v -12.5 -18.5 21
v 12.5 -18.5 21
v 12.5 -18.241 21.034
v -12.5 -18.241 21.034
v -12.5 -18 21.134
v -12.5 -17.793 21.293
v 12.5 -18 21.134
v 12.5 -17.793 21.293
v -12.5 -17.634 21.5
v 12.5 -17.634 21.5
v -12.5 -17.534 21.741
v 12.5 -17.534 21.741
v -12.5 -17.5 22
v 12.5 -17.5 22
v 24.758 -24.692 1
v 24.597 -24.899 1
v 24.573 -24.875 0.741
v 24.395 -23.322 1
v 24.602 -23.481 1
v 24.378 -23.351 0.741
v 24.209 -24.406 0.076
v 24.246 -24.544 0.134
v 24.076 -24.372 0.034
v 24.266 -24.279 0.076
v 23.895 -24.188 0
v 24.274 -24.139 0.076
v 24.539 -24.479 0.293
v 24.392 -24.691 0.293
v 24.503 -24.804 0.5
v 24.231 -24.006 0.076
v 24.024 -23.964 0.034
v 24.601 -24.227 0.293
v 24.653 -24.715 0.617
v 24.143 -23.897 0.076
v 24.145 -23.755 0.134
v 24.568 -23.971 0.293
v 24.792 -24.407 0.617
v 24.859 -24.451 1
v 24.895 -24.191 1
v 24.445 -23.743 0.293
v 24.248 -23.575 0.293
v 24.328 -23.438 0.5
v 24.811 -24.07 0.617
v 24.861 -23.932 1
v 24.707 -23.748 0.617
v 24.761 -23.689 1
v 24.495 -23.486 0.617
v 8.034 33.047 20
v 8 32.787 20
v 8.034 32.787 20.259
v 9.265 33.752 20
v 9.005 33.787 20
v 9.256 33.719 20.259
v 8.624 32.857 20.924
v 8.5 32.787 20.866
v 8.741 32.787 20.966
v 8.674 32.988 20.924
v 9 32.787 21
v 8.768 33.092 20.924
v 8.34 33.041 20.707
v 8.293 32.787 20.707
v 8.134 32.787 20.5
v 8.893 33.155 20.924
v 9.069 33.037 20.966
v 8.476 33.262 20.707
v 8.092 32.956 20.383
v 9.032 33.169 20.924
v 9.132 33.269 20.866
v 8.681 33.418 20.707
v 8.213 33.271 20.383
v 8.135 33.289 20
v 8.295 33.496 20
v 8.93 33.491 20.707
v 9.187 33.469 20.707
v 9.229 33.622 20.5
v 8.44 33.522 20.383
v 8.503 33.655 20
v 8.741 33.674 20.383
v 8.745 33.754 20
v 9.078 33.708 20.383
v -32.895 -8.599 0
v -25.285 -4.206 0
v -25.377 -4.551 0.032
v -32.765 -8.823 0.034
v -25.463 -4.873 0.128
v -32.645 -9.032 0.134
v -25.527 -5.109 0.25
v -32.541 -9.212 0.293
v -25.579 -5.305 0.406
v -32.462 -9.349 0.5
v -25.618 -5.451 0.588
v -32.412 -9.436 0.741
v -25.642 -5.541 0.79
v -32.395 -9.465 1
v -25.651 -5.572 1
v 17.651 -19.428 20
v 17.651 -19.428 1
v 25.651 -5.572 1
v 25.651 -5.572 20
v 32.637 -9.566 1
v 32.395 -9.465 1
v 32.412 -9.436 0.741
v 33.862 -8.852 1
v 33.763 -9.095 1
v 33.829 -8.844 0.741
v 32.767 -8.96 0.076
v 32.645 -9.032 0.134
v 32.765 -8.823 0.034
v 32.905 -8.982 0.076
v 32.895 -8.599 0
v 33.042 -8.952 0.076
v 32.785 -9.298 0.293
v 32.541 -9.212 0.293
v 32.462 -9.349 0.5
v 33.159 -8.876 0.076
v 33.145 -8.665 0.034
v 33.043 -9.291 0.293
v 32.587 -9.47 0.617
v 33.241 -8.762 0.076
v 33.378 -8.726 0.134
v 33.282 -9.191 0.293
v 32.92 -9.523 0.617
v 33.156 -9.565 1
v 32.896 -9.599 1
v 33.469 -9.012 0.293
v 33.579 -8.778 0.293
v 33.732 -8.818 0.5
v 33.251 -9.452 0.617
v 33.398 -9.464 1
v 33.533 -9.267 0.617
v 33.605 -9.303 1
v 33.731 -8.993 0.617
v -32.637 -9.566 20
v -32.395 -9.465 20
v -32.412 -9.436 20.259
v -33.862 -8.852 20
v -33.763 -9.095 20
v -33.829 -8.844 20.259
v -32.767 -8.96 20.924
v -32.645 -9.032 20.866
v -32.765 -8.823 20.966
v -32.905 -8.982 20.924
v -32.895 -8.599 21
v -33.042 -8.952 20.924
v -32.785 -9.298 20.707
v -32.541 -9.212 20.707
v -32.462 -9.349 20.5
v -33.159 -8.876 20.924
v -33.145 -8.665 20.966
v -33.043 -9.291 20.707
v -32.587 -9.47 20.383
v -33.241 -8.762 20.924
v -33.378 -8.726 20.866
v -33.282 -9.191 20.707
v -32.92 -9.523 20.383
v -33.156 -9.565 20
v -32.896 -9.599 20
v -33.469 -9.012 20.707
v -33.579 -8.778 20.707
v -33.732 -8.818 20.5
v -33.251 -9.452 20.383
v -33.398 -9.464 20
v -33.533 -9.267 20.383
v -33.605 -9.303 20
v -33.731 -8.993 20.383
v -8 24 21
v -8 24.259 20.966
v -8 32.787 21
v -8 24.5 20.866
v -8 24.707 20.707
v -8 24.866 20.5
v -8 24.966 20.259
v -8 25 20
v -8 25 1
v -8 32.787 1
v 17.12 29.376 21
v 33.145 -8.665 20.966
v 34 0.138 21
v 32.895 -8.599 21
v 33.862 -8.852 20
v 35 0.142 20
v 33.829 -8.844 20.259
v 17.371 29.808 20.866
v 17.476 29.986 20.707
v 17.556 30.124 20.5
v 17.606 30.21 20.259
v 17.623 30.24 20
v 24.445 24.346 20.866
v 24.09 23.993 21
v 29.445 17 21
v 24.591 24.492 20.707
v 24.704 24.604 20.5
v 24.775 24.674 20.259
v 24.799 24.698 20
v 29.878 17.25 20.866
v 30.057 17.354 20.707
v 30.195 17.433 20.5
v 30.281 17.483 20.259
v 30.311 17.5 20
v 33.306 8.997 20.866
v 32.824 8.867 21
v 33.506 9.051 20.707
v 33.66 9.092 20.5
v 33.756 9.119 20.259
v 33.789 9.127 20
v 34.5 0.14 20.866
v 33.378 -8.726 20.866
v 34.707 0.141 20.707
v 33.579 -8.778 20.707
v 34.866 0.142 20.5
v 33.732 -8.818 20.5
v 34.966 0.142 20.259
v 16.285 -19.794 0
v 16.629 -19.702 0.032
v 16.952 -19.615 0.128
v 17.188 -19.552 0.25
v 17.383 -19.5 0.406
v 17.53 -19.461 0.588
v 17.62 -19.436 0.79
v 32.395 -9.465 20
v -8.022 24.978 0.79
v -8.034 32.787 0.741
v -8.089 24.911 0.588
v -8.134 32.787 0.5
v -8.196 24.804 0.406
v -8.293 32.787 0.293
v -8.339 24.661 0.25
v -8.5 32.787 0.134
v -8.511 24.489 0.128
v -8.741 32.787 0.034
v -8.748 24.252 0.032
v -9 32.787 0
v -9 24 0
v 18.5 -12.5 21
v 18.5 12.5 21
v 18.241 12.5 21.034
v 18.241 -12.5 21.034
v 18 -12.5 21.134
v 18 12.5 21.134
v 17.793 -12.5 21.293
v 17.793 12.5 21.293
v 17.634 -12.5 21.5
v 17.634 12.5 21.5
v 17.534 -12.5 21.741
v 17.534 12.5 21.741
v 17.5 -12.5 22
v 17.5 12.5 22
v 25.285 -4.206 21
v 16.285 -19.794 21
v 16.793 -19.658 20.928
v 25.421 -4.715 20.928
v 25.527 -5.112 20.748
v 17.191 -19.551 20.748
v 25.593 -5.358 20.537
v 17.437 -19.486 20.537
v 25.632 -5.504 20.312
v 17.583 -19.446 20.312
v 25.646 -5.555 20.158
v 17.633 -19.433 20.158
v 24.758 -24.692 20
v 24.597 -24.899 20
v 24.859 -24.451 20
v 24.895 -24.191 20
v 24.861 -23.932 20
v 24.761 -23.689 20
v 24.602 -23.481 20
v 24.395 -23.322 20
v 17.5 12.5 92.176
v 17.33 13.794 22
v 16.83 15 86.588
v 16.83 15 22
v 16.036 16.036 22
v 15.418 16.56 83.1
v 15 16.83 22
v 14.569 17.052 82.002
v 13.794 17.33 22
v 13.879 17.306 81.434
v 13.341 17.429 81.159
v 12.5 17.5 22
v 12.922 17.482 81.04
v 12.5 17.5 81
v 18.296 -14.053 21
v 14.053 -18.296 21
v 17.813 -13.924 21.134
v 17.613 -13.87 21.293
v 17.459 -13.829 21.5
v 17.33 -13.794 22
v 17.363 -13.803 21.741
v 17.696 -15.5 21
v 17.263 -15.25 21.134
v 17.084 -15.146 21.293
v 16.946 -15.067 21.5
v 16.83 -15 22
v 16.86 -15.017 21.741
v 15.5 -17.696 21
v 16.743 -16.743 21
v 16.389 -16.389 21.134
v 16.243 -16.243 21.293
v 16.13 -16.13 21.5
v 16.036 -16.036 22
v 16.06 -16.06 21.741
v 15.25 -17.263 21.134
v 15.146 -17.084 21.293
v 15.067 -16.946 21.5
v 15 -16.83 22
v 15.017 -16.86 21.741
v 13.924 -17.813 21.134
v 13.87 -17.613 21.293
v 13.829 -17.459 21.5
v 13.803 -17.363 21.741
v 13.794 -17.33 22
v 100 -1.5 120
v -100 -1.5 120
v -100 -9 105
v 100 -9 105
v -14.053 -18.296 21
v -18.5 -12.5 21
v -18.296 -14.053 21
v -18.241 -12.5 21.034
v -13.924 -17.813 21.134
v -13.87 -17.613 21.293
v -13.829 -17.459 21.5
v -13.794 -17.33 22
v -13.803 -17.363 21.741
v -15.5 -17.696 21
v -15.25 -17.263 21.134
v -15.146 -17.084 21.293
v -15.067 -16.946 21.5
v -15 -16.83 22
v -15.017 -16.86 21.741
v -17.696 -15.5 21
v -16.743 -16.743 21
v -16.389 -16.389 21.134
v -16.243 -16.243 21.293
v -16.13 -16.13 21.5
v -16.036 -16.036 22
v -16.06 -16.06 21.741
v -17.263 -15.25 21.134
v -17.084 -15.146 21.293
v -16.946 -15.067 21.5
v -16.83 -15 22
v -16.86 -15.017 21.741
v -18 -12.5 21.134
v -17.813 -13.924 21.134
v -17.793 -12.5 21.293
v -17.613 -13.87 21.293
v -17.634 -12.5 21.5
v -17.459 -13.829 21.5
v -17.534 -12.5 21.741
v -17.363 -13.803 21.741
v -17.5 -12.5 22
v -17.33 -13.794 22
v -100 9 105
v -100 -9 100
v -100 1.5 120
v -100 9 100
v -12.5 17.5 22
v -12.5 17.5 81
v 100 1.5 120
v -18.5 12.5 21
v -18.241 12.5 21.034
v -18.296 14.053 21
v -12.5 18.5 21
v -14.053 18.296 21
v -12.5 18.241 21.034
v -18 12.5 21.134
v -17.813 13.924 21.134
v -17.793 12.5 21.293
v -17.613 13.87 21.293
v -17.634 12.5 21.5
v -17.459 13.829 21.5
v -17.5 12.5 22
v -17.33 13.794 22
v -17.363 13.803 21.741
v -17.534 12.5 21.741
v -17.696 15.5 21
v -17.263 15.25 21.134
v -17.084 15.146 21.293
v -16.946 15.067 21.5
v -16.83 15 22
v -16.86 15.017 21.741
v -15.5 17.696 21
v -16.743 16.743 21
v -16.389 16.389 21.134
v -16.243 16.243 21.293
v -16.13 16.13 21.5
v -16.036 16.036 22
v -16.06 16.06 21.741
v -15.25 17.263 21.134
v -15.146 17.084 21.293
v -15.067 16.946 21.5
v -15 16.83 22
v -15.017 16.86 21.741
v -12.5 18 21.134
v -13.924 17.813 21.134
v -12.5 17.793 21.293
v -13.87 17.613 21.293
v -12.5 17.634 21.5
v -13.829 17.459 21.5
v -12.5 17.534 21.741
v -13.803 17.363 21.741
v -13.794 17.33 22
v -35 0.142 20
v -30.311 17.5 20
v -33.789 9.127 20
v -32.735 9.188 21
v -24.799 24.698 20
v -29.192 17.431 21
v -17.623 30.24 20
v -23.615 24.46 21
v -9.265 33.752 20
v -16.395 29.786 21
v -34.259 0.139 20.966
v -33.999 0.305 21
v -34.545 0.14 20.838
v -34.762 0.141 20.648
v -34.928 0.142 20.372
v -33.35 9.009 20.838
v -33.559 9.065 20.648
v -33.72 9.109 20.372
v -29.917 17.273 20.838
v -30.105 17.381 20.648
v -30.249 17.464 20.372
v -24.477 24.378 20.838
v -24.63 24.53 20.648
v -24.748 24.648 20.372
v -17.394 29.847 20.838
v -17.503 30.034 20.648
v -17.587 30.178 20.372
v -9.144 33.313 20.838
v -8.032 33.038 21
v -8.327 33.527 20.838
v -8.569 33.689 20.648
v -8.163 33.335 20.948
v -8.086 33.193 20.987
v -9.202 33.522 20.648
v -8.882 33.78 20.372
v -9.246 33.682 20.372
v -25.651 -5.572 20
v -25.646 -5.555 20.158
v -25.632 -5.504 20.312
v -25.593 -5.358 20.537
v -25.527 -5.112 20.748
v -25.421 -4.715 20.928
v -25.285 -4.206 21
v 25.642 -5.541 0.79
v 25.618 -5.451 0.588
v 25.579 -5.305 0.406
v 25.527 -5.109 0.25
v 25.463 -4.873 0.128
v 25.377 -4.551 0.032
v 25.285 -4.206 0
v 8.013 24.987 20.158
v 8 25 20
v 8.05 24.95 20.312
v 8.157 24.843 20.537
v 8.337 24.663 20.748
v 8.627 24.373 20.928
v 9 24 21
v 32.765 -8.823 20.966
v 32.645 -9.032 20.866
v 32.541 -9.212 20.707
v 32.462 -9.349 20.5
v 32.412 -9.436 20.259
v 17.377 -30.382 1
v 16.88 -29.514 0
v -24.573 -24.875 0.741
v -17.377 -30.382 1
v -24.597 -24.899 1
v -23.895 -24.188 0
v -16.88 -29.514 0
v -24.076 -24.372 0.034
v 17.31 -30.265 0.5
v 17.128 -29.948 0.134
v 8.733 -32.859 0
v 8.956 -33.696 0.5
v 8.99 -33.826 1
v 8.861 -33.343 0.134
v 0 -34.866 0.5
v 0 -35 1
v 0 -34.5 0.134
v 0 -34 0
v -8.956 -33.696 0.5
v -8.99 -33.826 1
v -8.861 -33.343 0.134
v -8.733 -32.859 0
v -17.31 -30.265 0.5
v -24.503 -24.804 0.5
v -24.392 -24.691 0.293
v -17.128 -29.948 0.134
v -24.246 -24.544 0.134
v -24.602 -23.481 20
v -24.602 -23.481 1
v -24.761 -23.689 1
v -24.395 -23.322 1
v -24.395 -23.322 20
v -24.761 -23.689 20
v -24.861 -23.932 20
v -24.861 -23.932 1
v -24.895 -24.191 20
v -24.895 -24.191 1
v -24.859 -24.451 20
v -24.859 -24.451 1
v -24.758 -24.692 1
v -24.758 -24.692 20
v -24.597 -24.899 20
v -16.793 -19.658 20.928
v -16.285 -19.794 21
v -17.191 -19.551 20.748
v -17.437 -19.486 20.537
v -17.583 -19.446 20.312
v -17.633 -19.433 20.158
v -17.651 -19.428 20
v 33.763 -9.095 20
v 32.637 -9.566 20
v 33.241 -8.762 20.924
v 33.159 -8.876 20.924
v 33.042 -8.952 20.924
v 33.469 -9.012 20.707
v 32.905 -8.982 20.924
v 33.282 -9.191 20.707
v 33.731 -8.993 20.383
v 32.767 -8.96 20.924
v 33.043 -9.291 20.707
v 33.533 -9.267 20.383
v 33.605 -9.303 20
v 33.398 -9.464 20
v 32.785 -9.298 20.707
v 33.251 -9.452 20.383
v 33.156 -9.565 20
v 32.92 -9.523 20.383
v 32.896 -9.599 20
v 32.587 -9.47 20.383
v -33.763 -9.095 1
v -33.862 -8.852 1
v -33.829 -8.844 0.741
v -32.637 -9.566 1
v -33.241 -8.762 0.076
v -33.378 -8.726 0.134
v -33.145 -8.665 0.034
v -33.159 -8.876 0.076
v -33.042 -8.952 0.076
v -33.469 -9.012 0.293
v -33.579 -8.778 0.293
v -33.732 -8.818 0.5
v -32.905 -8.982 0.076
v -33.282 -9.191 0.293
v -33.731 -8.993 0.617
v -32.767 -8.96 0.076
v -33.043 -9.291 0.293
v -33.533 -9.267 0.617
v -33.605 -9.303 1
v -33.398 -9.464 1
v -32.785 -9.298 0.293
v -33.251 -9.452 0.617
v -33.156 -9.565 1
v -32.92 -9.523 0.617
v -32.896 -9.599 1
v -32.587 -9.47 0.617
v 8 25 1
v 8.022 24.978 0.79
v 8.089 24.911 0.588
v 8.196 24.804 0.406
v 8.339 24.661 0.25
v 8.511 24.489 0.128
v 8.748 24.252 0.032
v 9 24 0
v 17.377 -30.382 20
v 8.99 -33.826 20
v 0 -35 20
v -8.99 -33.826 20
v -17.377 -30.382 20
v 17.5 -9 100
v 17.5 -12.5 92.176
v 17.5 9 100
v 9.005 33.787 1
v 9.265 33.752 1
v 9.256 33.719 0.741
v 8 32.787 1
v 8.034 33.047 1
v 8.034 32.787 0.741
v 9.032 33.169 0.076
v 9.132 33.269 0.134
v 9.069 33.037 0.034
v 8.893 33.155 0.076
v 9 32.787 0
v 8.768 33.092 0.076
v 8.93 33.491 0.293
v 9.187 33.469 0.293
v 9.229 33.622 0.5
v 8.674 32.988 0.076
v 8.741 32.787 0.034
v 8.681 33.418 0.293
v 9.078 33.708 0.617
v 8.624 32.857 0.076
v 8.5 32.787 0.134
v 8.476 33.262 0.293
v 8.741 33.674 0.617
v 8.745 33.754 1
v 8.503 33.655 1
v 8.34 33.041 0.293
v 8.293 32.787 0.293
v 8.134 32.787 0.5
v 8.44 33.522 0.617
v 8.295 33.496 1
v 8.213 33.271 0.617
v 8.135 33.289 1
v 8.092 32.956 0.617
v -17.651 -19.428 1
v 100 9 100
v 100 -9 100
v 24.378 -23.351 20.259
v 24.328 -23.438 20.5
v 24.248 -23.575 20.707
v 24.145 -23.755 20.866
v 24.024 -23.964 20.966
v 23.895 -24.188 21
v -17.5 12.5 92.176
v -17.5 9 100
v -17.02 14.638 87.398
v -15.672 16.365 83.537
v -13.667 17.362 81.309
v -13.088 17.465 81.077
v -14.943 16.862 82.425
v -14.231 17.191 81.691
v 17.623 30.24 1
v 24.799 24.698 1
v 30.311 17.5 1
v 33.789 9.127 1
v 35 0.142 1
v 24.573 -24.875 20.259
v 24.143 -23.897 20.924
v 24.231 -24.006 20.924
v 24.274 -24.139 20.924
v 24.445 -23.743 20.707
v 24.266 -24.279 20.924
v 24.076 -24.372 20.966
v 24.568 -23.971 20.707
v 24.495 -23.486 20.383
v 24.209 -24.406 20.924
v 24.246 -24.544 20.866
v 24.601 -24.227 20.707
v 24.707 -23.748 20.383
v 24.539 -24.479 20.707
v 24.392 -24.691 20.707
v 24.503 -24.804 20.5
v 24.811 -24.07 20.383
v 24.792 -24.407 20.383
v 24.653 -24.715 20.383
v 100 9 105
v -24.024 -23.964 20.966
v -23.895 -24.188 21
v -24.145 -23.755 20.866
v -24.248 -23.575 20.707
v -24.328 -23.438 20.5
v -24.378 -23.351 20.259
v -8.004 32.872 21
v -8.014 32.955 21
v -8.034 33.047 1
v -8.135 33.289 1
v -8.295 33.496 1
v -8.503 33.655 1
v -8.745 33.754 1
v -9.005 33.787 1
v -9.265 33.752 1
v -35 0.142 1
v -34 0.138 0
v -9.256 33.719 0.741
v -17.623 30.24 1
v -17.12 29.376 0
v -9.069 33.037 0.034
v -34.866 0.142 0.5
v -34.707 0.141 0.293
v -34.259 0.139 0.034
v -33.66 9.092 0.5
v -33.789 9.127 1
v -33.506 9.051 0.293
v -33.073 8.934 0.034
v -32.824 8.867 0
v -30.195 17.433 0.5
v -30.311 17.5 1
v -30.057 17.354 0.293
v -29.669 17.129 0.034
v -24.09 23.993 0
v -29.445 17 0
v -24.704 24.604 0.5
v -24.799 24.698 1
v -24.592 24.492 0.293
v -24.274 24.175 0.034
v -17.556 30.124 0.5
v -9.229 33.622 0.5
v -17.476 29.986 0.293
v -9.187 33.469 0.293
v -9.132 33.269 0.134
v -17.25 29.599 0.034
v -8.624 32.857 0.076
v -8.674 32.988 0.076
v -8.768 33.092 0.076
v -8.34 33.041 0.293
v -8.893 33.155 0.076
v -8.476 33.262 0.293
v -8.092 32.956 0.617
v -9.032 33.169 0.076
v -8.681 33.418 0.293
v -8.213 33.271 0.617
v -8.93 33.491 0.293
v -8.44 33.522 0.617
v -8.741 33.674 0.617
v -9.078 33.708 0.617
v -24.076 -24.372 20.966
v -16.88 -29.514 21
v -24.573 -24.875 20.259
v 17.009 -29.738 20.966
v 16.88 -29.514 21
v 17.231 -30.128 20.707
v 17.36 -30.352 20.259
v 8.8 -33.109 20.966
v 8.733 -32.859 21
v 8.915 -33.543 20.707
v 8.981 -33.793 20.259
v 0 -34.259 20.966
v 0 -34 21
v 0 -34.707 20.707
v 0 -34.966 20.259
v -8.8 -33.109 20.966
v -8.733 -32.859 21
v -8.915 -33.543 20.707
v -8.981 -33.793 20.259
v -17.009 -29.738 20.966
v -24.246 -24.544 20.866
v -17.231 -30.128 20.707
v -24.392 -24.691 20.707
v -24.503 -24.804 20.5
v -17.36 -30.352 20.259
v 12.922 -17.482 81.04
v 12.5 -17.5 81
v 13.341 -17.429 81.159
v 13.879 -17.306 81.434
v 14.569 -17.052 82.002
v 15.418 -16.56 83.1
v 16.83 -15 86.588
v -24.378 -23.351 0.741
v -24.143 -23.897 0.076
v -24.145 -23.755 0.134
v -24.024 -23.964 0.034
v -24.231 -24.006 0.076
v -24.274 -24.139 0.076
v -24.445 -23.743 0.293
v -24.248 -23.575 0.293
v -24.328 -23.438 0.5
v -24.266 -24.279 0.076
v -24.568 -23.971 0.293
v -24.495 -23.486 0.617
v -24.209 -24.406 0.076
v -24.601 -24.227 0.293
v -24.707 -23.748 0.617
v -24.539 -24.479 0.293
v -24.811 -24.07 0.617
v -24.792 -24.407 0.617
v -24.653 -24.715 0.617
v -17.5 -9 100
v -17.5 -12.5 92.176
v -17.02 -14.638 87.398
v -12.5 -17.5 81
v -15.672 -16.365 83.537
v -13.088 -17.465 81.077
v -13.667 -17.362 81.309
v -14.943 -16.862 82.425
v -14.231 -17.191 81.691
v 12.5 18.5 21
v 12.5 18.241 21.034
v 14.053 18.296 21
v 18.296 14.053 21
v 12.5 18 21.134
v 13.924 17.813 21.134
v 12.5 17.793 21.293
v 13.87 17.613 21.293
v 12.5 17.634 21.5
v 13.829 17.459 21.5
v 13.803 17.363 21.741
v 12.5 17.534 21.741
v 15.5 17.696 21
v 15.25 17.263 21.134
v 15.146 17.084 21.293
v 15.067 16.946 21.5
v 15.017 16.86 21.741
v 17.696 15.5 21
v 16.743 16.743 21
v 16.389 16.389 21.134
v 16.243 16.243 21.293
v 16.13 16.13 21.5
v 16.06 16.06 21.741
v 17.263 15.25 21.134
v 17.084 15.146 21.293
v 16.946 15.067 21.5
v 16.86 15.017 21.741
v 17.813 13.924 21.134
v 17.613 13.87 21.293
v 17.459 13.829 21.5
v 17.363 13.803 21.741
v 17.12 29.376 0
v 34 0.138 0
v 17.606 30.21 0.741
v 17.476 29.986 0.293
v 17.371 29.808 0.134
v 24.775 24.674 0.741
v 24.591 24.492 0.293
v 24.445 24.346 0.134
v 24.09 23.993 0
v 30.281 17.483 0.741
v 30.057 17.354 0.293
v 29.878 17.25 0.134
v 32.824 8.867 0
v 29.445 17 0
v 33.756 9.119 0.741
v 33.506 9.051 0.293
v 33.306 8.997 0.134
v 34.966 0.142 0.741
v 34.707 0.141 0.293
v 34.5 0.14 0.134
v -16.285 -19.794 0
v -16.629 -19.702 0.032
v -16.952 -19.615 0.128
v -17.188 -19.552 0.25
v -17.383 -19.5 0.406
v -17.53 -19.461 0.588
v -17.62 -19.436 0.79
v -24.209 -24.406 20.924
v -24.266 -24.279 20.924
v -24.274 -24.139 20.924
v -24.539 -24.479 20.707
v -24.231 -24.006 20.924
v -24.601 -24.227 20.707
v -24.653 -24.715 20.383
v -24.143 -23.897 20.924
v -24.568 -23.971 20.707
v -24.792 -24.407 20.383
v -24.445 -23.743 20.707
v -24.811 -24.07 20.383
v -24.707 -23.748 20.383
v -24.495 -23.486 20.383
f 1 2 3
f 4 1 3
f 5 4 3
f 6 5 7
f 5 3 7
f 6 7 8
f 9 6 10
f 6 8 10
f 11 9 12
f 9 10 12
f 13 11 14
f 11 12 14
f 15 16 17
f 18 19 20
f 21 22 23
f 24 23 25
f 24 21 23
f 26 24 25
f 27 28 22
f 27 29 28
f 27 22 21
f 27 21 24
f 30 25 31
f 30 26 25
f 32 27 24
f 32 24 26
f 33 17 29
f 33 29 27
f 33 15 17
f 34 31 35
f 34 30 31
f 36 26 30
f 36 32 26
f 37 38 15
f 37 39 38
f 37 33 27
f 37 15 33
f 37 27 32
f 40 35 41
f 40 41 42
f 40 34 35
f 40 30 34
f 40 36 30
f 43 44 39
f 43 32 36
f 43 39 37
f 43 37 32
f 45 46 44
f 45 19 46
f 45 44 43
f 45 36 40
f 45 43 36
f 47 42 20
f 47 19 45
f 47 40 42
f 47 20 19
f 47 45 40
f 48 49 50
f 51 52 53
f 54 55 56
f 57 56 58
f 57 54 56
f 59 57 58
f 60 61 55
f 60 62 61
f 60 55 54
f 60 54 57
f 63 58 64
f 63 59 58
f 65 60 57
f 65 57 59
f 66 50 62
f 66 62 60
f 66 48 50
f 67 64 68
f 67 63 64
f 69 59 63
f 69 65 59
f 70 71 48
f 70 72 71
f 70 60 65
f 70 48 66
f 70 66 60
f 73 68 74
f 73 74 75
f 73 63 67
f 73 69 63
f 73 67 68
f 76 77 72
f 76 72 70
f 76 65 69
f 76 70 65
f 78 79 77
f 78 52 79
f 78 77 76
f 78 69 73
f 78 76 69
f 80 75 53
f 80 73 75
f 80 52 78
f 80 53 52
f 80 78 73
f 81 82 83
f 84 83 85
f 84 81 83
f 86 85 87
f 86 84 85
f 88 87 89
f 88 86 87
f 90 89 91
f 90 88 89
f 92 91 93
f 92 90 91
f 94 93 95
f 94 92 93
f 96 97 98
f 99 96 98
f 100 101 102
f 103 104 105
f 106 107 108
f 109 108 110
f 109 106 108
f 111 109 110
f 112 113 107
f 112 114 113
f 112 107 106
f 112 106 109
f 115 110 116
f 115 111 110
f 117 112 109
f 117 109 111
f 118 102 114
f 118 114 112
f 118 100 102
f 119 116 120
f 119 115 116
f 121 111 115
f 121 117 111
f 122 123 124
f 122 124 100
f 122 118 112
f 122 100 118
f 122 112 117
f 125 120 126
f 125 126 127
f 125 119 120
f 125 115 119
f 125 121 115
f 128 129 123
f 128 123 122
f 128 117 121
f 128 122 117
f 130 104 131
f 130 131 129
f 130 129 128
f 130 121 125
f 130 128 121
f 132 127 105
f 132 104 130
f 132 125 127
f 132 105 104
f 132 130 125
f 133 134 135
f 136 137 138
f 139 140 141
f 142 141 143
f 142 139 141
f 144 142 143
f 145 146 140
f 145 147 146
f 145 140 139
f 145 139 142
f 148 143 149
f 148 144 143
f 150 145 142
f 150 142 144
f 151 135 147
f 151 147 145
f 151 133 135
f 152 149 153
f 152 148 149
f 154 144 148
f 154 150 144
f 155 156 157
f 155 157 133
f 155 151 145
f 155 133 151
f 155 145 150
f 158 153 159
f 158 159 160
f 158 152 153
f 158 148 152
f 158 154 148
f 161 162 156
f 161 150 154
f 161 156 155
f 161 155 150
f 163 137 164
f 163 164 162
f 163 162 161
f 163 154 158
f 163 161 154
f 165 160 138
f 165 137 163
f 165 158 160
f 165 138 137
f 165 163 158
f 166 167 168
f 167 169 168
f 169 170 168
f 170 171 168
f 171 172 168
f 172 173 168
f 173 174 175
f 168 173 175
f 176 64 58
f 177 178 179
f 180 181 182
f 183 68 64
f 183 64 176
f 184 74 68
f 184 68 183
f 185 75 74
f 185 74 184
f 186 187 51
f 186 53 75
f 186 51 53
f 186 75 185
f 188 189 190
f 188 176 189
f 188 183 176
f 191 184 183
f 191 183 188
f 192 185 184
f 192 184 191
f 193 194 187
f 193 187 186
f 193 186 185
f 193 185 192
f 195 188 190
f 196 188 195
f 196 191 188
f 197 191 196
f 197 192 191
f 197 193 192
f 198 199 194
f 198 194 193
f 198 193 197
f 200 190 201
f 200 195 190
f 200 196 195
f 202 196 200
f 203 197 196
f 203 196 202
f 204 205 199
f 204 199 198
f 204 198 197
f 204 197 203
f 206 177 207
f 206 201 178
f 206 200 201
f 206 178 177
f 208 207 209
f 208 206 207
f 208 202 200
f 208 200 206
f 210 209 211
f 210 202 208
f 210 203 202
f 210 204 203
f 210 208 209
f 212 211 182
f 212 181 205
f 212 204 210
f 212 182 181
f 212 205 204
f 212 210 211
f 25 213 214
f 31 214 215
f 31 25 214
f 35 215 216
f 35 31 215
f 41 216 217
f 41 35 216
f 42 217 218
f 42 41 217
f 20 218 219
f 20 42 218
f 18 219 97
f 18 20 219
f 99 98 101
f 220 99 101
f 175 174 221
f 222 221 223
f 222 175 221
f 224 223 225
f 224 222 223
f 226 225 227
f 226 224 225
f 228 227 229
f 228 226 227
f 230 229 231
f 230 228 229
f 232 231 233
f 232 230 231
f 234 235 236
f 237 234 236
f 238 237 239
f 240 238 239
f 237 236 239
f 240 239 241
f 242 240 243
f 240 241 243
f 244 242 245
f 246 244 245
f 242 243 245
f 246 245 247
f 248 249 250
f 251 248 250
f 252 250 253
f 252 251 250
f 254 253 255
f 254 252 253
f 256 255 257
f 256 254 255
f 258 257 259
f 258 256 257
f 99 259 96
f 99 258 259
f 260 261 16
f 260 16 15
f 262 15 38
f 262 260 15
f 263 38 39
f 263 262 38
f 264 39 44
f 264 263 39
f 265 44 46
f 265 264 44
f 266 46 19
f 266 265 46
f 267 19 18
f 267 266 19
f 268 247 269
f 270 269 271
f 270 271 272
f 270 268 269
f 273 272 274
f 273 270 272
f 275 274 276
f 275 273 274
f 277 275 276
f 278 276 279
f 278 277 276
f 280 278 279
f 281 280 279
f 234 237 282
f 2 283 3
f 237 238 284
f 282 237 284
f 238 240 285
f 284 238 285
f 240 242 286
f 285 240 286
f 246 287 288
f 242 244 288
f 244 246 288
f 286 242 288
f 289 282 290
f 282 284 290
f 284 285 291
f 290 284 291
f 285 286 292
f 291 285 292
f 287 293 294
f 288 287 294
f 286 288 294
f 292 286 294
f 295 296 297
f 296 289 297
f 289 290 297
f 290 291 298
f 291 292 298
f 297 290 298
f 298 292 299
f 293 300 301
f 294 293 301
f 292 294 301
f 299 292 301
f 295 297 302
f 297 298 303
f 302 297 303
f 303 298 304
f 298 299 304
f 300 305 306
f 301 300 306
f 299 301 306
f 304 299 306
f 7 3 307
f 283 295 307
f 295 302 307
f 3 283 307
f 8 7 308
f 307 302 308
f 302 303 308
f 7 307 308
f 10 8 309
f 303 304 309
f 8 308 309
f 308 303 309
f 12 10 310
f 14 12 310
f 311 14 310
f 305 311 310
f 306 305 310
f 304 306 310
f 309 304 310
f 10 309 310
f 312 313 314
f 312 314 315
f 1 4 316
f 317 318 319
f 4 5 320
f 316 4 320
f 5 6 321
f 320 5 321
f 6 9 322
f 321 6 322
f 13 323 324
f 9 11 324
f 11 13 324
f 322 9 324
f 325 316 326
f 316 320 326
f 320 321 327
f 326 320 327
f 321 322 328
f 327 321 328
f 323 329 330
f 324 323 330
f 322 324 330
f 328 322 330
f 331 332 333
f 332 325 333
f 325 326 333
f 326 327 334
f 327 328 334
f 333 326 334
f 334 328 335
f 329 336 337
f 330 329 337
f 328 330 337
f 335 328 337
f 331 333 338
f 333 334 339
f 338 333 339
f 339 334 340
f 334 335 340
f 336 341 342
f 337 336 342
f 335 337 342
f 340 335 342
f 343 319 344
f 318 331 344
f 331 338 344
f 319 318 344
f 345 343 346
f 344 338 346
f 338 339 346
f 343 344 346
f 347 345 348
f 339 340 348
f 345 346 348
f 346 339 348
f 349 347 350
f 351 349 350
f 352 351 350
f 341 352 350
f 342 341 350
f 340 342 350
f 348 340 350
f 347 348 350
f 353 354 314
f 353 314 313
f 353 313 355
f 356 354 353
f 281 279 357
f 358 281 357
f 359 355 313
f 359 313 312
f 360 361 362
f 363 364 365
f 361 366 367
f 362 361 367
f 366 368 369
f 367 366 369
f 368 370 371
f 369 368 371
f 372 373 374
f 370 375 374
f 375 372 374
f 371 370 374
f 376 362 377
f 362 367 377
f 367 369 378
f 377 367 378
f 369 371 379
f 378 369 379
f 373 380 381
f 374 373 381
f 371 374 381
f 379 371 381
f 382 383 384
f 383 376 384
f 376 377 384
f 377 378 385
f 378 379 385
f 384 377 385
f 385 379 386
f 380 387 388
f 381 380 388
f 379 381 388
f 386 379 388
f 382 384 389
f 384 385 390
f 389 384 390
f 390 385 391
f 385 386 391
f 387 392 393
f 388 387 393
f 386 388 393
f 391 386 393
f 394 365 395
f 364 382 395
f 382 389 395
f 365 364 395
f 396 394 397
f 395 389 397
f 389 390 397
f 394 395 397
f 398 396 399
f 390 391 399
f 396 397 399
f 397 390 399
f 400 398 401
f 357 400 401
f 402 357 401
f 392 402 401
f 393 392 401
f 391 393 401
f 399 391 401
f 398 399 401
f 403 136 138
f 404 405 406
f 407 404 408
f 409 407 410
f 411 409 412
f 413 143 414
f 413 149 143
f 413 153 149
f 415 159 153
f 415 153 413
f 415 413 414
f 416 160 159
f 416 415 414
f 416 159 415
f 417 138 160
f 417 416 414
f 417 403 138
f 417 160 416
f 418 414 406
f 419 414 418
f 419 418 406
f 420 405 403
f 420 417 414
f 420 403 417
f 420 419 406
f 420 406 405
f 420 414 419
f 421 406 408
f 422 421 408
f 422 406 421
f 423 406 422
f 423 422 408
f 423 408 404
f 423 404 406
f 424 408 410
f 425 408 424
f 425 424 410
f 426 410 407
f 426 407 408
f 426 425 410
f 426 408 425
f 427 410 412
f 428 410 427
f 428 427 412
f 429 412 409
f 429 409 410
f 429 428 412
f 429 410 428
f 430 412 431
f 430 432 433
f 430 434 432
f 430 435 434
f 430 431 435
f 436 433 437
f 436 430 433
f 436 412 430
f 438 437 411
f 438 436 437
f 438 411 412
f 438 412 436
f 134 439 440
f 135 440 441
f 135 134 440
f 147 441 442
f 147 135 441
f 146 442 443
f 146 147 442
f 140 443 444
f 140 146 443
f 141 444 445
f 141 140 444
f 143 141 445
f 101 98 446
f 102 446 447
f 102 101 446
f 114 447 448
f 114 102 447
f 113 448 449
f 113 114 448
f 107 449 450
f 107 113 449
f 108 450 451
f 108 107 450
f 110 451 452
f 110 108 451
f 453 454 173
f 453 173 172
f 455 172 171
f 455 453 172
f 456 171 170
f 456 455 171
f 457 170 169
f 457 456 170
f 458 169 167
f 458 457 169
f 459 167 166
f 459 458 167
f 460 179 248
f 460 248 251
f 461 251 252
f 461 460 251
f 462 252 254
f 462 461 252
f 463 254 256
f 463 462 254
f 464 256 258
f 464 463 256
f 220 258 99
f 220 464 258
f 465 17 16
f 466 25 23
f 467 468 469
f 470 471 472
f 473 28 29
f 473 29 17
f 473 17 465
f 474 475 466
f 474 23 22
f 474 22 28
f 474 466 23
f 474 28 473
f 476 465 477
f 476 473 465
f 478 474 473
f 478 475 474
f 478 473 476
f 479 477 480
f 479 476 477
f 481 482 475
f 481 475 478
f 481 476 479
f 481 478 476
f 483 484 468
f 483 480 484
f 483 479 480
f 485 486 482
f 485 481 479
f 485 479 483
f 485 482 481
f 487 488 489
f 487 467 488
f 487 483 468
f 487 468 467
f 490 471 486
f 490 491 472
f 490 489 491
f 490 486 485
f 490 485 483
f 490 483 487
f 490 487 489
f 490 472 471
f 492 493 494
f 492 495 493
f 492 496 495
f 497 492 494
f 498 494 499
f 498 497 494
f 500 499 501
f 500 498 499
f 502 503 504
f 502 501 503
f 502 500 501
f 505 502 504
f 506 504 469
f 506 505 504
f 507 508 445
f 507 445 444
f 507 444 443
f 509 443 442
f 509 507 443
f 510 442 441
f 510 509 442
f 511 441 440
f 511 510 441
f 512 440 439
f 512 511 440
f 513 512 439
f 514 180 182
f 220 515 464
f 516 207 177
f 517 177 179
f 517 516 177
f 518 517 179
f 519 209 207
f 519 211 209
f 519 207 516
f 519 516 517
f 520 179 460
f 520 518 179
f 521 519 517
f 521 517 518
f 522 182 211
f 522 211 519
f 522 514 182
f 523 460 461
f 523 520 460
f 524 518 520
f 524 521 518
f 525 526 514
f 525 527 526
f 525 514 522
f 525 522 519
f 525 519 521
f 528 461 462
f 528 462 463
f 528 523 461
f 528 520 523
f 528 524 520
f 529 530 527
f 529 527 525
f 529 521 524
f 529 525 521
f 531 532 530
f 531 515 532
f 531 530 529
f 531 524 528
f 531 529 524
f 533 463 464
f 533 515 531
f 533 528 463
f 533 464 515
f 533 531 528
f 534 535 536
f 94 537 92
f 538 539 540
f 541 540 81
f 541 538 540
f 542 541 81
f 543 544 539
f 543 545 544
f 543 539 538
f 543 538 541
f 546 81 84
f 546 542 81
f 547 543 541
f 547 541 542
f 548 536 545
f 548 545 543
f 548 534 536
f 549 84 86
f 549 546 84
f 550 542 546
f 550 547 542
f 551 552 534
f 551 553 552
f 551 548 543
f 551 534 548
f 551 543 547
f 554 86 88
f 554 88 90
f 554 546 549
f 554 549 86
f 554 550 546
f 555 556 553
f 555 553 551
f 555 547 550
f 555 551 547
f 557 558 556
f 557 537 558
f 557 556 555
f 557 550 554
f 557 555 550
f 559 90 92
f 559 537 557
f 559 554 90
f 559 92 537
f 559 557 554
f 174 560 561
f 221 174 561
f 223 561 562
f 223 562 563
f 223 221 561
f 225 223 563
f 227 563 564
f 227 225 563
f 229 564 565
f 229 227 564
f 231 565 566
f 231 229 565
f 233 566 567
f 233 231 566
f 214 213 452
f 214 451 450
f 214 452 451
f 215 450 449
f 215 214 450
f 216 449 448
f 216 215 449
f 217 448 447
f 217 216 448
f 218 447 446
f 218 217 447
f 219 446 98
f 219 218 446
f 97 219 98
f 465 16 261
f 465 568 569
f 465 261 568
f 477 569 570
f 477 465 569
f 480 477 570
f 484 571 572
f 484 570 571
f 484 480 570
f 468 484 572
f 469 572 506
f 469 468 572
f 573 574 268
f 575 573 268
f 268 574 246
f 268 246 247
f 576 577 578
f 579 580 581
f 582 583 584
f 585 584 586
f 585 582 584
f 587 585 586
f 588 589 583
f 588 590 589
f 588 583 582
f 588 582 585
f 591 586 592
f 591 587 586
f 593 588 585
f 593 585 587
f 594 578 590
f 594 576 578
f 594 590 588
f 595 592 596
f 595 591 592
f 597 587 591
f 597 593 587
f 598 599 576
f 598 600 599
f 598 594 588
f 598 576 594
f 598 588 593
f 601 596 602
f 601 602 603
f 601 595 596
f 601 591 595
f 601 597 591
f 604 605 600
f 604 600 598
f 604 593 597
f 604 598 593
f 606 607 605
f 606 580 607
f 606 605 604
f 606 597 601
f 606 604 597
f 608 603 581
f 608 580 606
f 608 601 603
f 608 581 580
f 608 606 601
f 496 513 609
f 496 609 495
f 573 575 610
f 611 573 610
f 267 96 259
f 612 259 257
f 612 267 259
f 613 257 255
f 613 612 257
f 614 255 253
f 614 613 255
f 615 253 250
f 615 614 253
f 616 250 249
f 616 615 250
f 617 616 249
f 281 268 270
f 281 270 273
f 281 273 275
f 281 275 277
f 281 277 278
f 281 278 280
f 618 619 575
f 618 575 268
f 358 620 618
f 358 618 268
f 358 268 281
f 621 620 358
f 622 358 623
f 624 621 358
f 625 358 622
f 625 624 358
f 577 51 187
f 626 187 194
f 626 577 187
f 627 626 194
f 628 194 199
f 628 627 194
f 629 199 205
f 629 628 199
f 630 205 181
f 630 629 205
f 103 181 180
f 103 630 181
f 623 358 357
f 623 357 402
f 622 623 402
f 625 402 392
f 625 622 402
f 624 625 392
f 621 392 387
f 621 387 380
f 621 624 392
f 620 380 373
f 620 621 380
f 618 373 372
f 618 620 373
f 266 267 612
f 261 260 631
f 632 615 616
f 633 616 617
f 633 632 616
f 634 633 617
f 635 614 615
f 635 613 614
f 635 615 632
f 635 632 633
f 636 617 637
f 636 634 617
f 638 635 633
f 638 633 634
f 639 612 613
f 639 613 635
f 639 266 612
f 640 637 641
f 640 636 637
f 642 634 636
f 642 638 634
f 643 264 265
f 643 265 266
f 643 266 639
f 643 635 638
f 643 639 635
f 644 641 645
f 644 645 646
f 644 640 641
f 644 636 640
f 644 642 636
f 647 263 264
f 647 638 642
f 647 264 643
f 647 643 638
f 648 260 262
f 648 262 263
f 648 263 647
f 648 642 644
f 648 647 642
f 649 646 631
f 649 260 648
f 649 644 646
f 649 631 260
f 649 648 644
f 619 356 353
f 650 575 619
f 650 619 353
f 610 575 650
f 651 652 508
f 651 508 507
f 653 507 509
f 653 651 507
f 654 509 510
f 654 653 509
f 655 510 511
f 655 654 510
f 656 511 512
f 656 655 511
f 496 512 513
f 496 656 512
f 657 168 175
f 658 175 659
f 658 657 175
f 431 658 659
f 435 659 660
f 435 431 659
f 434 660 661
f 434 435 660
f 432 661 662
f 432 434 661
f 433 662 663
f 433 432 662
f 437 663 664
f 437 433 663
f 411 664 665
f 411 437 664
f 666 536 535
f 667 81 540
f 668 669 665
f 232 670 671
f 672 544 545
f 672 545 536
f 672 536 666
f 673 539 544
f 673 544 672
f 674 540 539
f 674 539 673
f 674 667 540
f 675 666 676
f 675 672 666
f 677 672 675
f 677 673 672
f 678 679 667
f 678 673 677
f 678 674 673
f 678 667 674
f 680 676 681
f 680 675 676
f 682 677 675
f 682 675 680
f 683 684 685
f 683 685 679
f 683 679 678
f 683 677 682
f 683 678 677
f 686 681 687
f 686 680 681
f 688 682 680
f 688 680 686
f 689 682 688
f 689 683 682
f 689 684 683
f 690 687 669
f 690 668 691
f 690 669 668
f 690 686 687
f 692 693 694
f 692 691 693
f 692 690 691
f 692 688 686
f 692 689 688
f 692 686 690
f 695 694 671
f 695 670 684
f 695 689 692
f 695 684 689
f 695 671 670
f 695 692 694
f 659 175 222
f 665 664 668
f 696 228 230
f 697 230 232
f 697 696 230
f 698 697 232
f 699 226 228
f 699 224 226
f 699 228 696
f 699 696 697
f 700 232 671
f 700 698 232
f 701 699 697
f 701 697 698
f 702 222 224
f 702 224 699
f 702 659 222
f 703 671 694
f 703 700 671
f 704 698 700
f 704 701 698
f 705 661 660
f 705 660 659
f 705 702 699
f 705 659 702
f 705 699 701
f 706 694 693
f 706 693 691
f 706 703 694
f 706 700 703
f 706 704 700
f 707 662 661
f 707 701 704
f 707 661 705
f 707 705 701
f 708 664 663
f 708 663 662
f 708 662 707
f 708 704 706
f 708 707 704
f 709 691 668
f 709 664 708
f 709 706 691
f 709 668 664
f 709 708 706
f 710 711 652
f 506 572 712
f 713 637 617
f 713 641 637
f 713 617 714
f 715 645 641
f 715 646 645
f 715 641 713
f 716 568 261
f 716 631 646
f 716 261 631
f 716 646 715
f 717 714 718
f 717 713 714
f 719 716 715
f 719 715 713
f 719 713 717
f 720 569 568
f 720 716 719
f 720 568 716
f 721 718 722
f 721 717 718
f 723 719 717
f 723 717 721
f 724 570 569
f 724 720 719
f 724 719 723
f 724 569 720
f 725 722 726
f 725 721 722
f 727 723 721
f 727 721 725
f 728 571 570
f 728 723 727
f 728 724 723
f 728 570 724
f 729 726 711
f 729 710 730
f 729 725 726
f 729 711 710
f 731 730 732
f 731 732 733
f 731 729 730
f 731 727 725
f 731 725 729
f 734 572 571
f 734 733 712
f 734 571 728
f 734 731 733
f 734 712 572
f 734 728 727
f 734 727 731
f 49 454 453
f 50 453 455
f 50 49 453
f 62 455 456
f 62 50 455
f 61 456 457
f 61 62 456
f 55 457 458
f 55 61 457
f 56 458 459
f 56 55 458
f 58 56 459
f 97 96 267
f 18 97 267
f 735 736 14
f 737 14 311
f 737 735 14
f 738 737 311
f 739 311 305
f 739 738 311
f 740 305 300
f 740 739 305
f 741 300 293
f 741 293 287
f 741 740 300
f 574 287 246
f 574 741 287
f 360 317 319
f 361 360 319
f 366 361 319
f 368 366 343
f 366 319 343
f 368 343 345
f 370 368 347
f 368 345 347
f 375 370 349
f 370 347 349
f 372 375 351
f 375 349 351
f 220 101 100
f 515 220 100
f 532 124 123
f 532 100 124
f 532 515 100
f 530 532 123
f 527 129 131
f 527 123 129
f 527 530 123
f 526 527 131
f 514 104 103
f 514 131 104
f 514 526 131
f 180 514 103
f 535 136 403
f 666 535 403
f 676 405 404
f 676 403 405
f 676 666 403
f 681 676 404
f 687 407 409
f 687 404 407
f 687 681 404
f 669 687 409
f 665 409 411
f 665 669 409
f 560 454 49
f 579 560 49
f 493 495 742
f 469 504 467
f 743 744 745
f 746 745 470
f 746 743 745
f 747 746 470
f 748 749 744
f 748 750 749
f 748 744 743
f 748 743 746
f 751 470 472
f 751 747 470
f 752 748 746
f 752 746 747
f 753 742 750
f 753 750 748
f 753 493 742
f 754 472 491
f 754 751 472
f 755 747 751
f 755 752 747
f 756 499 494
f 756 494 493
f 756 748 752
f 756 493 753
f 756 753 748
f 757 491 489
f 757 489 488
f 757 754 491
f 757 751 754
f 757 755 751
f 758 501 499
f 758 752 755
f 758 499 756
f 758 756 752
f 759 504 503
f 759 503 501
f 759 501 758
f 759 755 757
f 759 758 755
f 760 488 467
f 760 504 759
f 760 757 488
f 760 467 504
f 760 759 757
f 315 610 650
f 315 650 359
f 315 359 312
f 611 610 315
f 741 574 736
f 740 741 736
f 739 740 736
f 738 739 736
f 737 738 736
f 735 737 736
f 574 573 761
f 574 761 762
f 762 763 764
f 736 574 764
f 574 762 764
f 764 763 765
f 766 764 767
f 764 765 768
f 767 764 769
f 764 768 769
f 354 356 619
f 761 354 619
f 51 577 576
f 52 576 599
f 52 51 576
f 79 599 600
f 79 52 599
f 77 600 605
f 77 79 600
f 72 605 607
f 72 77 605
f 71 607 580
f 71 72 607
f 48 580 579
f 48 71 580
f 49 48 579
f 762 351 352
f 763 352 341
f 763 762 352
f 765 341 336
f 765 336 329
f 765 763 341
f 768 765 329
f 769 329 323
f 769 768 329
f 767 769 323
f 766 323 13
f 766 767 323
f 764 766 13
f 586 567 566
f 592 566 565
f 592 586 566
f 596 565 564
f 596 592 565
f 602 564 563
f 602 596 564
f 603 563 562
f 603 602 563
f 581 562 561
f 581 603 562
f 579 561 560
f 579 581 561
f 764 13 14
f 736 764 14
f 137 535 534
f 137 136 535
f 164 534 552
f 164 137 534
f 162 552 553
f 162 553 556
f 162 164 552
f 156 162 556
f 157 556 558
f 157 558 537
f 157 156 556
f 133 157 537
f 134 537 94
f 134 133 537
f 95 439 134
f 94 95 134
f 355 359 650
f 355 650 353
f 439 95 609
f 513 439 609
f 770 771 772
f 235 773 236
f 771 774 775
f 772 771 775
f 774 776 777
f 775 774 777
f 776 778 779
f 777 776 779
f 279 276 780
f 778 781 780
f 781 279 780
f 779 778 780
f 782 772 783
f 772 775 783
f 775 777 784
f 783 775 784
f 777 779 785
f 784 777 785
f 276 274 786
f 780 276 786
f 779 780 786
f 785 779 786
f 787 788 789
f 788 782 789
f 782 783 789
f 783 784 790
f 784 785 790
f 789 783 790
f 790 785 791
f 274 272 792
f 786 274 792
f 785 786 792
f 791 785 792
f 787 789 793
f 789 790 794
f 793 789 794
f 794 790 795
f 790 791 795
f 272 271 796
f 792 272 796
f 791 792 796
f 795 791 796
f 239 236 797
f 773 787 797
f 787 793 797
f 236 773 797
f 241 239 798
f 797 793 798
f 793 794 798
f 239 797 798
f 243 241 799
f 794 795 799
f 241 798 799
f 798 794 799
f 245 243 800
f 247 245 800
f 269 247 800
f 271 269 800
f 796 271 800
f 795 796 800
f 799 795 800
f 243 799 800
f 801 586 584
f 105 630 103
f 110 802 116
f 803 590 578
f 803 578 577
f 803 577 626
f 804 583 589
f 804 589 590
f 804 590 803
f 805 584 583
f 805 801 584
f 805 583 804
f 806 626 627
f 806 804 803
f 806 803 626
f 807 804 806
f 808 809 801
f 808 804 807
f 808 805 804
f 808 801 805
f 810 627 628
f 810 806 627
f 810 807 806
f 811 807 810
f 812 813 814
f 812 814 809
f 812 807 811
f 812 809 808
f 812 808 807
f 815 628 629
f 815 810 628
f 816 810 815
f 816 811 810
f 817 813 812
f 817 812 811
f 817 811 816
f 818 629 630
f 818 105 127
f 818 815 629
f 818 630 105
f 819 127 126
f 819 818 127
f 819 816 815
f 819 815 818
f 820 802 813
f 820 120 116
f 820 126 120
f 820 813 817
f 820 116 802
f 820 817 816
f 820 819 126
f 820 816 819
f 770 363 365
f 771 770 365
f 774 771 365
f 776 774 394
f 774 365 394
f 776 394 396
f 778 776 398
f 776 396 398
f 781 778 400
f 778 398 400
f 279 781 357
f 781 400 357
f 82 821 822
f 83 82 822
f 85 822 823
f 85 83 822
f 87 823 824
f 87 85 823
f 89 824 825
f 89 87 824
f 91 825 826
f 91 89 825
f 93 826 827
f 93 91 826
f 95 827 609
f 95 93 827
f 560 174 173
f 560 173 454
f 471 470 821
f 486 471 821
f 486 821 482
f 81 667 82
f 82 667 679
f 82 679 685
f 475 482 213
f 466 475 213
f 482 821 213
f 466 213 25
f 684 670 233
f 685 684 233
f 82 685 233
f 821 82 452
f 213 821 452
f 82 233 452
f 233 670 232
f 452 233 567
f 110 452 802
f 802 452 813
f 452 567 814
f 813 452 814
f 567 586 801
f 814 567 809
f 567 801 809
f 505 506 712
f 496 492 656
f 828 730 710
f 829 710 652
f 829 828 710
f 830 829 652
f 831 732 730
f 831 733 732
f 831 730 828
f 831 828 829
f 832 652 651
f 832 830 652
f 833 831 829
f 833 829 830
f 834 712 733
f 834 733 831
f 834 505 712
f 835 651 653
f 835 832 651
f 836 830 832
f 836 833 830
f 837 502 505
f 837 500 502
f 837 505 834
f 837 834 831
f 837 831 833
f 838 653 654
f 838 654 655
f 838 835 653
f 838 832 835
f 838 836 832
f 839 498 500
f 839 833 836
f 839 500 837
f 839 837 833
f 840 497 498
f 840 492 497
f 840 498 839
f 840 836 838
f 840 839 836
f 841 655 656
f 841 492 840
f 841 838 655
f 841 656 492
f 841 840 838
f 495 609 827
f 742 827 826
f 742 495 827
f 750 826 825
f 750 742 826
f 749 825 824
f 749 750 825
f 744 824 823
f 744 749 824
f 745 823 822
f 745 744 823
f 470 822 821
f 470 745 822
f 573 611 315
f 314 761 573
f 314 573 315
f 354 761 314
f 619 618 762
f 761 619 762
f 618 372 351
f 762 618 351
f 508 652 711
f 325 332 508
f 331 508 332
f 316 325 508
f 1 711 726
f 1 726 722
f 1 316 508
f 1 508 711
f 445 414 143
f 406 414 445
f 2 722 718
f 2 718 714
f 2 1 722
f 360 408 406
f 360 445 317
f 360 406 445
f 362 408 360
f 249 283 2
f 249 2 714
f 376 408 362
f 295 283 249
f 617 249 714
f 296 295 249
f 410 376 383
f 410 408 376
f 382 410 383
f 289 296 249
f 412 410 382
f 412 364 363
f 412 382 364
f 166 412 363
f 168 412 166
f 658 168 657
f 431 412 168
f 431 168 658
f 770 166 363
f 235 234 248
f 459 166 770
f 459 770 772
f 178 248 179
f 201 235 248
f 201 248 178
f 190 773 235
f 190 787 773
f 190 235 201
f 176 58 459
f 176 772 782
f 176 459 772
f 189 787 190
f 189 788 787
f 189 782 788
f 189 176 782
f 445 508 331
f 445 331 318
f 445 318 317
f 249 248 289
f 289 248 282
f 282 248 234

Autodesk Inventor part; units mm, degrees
ref_plane "YZ Plane" through (0, 0, 0) normal (1, 0, 0) x (0, 1, 0)
ref_plane "XZ Plane" through (0, 0, 0) normal (0, 1, 0) x (-1, 0, 0)
ref_plane "XY Plane" through (0, 0, 0) normal (0, 0, 1) x (1, 0, 0)
sketch "Sketch1" plane through (0, 0, 0) normal (0, 0, 1) x (1, 0, 0)
  circle A0 centre (0, 0) radius 25 construction
  line L0 (0, 0) -> (0, 25) construction
  line L1 (0, 0) -> (21.6506, -12.5) construction
  line L2 (0, 0) -> (-21.6506, -12.5) construction
  line L3 (0, 25) -> (8, 25)
  line L4 (0, 25) -> (-8, 25)
  line L5 (0, 25) -> (8, 25) construction
  line L6 (21.6506, -12.5) -> (25.6506, -5.5718)
  line L7 (21.6506, -12.5) -> (29.6506, -12.5) construction
  line L8 (21.6506, -12.5) -> (17.6506, -19.4282)
  line L9 (21.6506, -12.5) -> (29.6506, -12.5) construction
  line L10 (-21.6506, -12.5) -> (-25.6506, -5.5718)
  line L11 (-21.6506, -12.5) -> (-13.6506, -12.5) construction
  line L12 (-21.6506, -12.5) -> (-17.6506, -19.4282)
  line L13 (-21.6506, -12.5) -> (-13.6506, -12.5) construction
  line L14 (8, 25) -> (8, 34.0735)
  line L15 (-8, 25) -> (-8, 34.0735)
  line L16 (25.6506, -5.5718) -> (33.5085, -10.1085)
  line L17 (17.6506, -19.4282) -> (25.5085, -23.9649)
  line L18 (-17.6506, -19.4282) -> (-25.5085, -23.9649)
  line L19 (-25.6506, -5.5718) -> (-33.5085, -10.1085)
  arc A1 (33.5085, -10.1085) -> (8, 34.0735) centre (0, 0) ccw
  arc A2 (-8, 34.0735) -> (-33.5085, -10.1085) centre (0, 0) ccw
  arc A3 (-25.5085, -23.9649) -> (25.5085, -23.9649) centre (0, 0) ccw
  dimension "d0" = 50
  dimension "d1" = 120
  dimension "d2" = 120
  dimension "d3" = 8
  dimension "d4" = 8
  dimension "d5" = 180
  dimension "d6" = 8
  dimension "d7" = 60
  dimension "d8" = 8
  dimension "d9" = 120
  dimension "d10" = 8
  dimension "d11" = 120
  dimension "d12" = 8
  dimension "d13" = 60
  dimension "d15" = 35
  dimension "d16" = 35
  dimension "d17" = 35
extrude "Extrusion1" add sketch "Sketch1" along normal blind 21
sketch "Sketch2" plane through (0, 0, 21) normal (0, 0, 1) x (1, 0, 0)
  line L0 (-17.5, -17.5) -> (17.5, -17.5)
  line L1 (17.5, -17.5) -> (17.5, 17.5)
  line L2 (17.5, 17.5) -> (-17.5, 17.5)
  line L3 (-17.5, 17.5) -> (-17.5, -17.5)
  line L4 (-17.5, -17.5) -> (17.5, 17.5) construction
  line L5 (17.5, -17.5) -> (-17.5, 17.5) construction
  point P0 (0, 0)
  dimension "d20" = 35
  dimension "d21" = 35
extrude "Extrusion2" add sketch "Sketch2" along normal blind 79
fillet "Fillet1" radius 5 4 edges at (17.5, 17.5, 60.5) (17.5, -17.5, 60.5) (-17.5, 17.5, 60.5) (-17.5, -17.5, 60.5)
fillet "Fillet2" radius 1 37 edges at (30.3109, 17.5, 0) (-30.3109, 17.5, 0) (0, -35, 0) (21.6506, -12.5, 0) (29.5796, -7.8402, 0) (21.5796, -21.6966, 0) (8, 29.5367, 0) (0, 25, 0) (-8, 29.5367, 0) (-29.5796, -7.8402, 0) (-21.6506, -12.5, 0) (-21.5796, -21.6966, 0) (16.0355, 16.0355, 21) (17.5, 0, 21) (16.0355, -16.0355, 21) (0, -17.5, 21) (-16.0355, -16.0355, 21) (-17.5, 0, 21) (-16.0355, 16.0355, 21) (0, 17.5, 21) (0, 25, 21) (8, 29.5367, 21) (30.3109, 17.5, 21) (8, 34.0735, 10.5) (-8, 34.0735, 10.5) (-30.3109, 17.5, 21) (21.6506, -12.5, 21) (29.5796, -7.8402, 21) (33.5085, -10.1085, 10.5) (21.5796, -21.6966, 21) (25.5085, -23.9649, 10.5) (0, -35, 21) (-21.5796, -21.6966, 21) (-21.6506, -12.5, 21) (-29.5796, -7.8402, 21) (-33.5085, -10.1085, 10.5) (-25.5085, -23.9649, 10.5)
sketch "Sketch4" plane through (0, 0, 100) normal (0, 0, 1) x (1, 0, 0)
  line L0 (-100, 9) -> (100, 9)
  line L1 (100, 9) -> (100, -9)
  line L2 (100, -9) -> (-100, -9)
  line L3 (-100, -9) -> (-100, 9)
  line L4 (-100, 9) -> (100, -9) construction
  line L5 (100, 9) -> (-100, -9) construction
  point P0 (0, 0)
  dimension "d29" = 200
  dimension "d30" = 18
extrude "Extrusion4" add sketch "Sketch4" along normal blind 20
chamfer "Chamfer1" distance 15 distance2 7.5 1 edges at (0, 9, 120) measured on face at (-5.8333, 9, 113.3333)
chamfer "Chamfer2" distance 15 distance2 7.5 1 edges at (0, -9, 120) measured on face at (5.8333, -9, 113.3333)
sketch "Sketch5" plane through (-17.5, -12.5, 22) normal (-1, 0, 0) x (0, 0, 1)
  line L0 (78, 25) -> (78, 21.5) projected
  line L1 (78, 21.5) -> (59, 30)
  line L2 (78, 30) -> (0, 30) projected
  line L3 (78, 21.5) -> (78, 3.5) projected
  line L4 (78, 3.5) -> (59, -5)
  line L5 (0, -5) -> (78, -5) projected
  line L6 (-1, 45.5377) -> (-1, 3.9006) projected
  line L7 (-1, -11.6878) -> (-1, -21.5) projected
  line L8 (59, 30) -> (79.7538, 33.0683)
  line L9 (79.7538, 33.0683) -> (78, 21.5)
  line L10 (78, 0) -> (78, 3.5) projected
  line L11 (78, 3.5) -> (84.2924, -8.3159)
  line L12 (84.2924, -8.3159) -> (59, -5)
  point P0 (-22, 12.5)
  dimension "d39" = 60
  dimension "d40" = 60
extrude "Extrusion5" cut sketch "Sketch5" against normal through all
equation "\"d3\" = d4"
equation "\"d6\" = d4"
equation "\"d8\" = d4"
equation "\"d10\" = d4"
equation "\"d12\" = d4"
equation "\"d16\" = d15"
equation "\"d17\" = d15"
equation "\"d40\" = d39"
properties part number "Squeegee"
